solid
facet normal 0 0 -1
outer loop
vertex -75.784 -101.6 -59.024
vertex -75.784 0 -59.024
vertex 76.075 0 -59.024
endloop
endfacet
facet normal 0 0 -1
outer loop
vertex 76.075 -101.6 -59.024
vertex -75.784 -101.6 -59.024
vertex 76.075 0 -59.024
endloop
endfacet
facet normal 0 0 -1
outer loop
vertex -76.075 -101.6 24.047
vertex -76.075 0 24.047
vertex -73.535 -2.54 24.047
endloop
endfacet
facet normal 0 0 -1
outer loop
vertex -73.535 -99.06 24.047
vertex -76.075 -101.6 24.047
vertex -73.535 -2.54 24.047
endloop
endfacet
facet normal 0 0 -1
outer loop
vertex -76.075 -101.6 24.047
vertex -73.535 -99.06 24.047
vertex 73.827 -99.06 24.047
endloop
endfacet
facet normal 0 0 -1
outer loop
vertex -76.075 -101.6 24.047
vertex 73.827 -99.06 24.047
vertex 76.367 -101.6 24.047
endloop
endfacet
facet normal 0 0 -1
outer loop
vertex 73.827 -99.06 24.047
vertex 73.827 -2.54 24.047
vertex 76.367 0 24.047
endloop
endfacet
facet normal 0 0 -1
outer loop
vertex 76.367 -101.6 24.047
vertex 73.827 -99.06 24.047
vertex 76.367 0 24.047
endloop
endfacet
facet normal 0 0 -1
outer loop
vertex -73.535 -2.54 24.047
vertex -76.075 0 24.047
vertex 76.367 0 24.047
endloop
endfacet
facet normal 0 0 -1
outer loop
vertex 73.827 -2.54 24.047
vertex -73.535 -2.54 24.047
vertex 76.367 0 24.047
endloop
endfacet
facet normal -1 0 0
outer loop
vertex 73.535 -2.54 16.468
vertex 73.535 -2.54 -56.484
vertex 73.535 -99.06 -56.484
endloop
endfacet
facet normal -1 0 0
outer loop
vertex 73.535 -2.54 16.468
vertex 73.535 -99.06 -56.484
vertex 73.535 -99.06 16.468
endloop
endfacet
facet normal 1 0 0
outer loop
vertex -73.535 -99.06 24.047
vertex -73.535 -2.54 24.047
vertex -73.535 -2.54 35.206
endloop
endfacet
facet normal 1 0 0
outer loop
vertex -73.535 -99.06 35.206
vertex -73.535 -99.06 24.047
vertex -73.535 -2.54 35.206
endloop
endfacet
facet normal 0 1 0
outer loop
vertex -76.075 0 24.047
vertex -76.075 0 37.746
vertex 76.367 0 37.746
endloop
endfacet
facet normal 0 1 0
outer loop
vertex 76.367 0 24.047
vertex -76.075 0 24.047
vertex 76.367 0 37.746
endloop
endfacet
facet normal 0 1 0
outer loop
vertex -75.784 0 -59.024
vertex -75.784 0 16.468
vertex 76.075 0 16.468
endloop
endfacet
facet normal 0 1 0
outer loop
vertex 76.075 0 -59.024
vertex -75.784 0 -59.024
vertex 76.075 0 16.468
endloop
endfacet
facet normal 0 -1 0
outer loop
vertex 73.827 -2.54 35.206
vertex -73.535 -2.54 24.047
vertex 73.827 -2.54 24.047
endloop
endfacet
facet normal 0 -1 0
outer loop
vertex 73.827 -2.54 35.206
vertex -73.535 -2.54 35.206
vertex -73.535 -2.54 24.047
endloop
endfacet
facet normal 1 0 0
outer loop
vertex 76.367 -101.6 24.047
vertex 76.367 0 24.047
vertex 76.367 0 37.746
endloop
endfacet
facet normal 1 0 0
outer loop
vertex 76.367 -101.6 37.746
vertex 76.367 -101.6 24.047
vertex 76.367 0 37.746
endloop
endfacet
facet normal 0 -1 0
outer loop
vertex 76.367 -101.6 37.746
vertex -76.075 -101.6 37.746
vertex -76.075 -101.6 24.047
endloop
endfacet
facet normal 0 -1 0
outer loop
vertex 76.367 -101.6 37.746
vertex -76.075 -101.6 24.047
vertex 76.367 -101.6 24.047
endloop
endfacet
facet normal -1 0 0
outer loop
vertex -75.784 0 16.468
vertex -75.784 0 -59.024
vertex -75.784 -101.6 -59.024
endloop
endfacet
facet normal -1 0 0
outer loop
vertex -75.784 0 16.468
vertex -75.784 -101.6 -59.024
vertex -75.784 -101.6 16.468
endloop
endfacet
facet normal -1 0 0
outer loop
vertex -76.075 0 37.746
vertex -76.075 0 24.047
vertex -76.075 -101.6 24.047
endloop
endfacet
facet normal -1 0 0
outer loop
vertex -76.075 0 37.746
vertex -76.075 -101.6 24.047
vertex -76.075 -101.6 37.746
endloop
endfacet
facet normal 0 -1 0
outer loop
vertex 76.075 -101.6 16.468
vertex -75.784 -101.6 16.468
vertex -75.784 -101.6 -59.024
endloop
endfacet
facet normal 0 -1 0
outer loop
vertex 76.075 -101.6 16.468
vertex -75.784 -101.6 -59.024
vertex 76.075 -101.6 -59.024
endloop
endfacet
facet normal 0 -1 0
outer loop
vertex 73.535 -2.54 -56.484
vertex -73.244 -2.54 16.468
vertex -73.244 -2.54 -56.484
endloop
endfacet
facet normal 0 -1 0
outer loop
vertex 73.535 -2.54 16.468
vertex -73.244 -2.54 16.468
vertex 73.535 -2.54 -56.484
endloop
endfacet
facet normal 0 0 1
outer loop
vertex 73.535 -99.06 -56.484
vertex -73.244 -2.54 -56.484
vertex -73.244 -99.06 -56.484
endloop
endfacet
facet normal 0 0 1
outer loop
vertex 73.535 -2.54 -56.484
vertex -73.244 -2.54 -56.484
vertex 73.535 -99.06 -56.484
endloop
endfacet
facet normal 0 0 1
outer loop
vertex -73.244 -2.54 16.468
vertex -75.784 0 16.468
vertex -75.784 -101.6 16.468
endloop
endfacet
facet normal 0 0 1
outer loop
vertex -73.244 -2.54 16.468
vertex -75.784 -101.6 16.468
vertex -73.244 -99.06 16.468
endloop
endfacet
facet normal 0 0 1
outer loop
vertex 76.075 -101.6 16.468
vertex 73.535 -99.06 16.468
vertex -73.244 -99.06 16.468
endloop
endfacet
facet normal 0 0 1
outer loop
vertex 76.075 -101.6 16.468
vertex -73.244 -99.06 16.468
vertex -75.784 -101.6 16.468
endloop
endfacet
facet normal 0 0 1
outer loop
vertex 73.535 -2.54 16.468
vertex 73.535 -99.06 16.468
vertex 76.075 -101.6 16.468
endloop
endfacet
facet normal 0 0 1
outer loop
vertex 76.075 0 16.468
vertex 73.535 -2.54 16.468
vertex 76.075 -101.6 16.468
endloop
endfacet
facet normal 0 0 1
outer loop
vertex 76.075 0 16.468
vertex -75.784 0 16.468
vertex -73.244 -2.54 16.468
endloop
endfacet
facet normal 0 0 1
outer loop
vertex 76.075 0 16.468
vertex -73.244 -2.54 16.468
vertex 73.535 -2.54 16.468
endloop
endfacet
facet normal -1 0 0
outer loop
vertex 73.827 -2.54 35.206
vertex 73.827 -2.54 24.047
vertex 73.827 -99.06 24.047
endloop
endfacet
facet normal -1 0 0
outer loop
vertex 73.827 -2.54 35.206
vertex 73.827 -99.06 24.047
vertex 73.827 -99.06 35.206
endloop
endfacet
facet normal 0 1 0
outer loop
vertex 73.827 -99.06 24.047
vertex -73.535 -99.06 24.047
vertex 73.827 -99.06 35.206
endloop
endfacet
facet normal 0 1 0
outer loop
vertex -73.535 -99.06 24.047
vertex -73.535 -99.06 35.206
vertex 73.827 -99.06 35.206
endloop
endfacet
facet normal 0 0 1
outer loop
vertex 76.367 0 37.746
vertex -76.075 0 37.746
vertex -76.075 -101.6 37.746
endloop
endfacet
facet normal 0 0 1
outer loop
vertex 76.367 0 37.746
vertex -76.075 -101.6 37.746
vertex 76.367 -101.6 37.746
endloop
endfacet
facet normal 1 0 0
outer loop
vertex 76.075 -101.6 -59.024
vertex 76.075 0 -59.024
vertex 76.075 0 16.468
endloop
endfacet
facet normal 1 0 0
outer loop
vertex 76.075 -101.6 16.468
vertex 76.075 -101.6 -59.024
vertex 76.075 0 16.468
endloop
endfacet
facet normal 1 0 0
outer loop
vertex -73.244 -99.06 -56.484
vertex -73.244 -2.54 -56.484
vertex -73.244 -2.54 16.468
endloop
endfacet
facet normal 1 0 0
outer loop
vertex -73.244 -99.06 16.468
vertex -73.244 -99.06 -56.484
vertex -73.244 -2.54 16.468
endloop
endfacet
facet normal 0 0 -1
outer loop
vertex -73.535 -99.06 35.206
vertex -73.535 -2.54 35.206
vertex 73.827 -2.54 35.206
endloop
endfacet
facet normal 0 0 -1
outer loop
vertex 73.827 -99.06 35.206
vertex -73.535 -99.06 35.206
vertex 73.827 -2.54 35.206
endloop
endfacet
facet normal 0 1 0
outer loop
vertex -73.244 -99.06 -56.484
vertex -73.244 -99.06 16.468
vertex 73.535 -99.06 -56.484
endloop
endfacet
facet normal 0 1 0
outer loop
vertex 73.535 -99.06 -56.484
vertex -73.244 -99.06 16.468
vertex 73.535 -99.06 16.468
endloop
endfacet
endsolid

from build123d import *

# Parameters (mm, degrees)
F0_W     = 151.858695
F0_H     = 75.492132
F1_DEPTH = 101.6
F2_T     = -2.54
F3_W     = 152.441644
F3_H     = 13.699347
F4_DEPTH = 101.6
F5_T     = -2.54


with BuildPart() as f1:
    # F0 (on Front) → F1 (new body)
    with BuildSketch(Plane.XZ):
        with Locations((0.145738, -21.277705)):
            Rectangle(F0_W, F0_H)
    extrude(amount=F1_DEPTH)

    # F2
    f2_openings = [f1.faces().sort_by_distance(p)[0] for p in [
        (0.145737, -50.8, 16.468361),
    ]]
    offset(amount=F2_T, openings=f2_openings)


with BuildPart() as f4:
    # F3 (on Front) → F4 (new body)
    with BuildSketch(Plane.XZ):
        with Locations((0.145737, 30.896394)):
            Rectangle(F3_W, F3_H)
    extrude(amount=F4_DEPTH)

    # F5
    f5_openings = [f4.faces().sort_by_distance(p)[0] for p in [
        (0.145737, -50.8, 24.046721),
    ]]
    offset(amount=F5_T, openings=f5_openings)


solid = Compound([f1.part, f4.part])
